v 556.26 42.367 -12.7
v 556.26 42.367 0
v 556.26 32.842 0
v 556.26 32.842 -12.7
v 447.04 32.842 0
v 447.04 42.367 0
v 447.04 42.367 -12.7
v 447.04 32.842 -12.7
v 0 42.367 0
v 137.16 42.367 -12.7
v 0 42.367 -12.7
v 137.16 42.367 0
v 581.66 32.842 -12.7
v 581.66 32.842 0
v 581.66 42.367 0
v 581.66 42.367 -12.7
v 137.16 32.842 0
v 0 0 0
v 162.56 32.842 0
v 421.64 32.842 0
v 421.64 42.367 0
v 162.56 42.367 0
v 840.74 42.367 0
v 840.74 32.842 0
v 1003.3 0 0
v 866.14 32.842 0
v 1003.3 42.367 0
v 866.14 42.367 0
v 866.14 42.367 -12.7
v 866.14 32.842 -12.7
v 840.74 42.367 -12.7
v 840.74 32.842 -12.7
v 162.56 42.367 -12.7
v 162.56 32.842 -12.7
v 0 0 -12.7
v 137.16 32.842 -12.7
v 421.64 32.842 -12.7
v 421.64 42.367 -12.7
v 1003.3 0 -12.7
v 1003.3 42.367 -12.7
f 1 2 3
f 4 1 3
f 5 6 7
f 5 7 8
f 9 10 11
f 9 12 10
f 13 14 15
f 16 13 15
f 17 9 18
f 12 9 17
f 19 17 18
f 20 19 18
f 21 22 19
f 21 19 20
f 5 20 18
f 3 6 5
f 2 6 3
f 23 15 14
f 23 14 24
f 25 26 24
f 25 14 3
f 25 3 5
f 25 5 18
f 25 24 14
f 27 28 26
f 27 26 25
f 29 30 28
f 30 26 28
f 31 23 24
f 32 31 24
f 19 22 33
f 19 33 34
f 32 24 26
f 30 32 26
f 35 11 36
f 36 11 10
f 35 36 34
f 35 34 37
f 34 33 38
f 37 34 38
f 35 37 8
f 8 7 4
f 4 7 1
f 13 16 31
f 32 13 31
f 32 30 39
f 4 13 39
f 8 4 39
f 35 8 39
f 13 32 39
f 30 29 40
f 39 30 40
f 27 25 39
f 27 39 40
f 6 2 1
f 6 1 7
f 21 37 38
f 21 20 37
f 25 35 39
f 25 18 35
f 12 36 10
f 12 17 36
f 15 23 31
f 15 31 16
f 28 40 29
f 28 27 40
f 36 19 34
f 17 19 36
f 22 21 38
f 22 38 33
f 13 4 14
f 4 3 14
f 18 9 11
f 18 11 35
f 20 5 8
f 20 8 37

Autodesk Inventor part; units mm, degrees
ref_plane "YZ Plane" through (0, 0, 0) normal (1, 0, 0) x (0, 1, 0)
ref_plane "XZ Plane" through (0, 0, 0) normal (0, 1, 0) x (-1, 0, 0)
ref_plane "XY Plane" through (0, 0, 0) normal (0, 0, 1) x (1, 0, 0)
sketch "Sketch1" plane through (0, 0, 0) normal (0, 0, 1) x (1, 0, 0)
  line L0 (0, 0) -> (1003.3, 0)
  line L1 (1003.3, 0) -> (1003.3, 42.3672)
  line L2 (1003.3, 42.3672) -> (0, 42.3672)
  line L3 (0, 42.3672) -> (0, 0)
  dimension "d0" = 42.3672
  dimension "d1" = 1003.3
extrude "Extrusion1" add sketch "Sketch1" against normal blind 12.7
sketch "Sketch2" plane through (0, 0, 0) normal (0, 0, 1) x (1, 0, 0)
  line L0 (1003.3, 0) -> (1003.3, 42.3672) projected
  line L1 (1003.3, 42.3672) -> (0, 42.3672) projected
  line L2 (0, 42.3672) -> (0, 0) projected
  line L3 (137.16, 42.3672) -> (162.56, 42.3672)
  line L4 (162.56, 42.3672) -> (162.56, 32.8422)
  line L5 (162.56, 32.8422) -> (137.16, 32.8422)
  line L6 (137.16, 32.8422) -> (137.16, 42.3672)
  line L7 (866.14, 42.3672) -> (840.74, 42.3672)
  line L8 (840.74, 42.3672) -> (840.74, 32.8422)
  line L9 (840.74, 32.8422) -> (866.14, 32.8422)
  line L10 (866.14, 32.8422) -> (866.14, 42.3672)
  line L11 (421.64, 42.3672) -> (447.04, 42.3672)
  line L12 (447.04, 42.3672) -> (447.04, 32.8422)
  line L13 (447.04, 32.8422) -> (421.64, 32.8422)
  line L14 (421.64, 32.8422) -> (421.64, 42.3672)
  line L15 (581.66, 42.3672) -> (556.26, 42.3672)
  line L16 (556.26, 42.3672) -> (556.26, 32.8422)
  line L17 (556.26, 32.8422) -> (581.66, 32.8422)
  line L18 (581.66, 32.8422) -> (581.66, 42.3672)
  dimension "d4" = 9.525
  dimension "d5" = 25.4
  dimension "d6" = 137.16
  dimension "d7" = 137.16
  dimension "d8" = 25.4
  dimension "d9" = 9.525
  dimension "d12" = 421.64
  dimension "d13" = 25.4
  dimension "d14" = 9.525
  dimension "d15" = 421.64
  dimension "d16" = 25.4
  dimension "d17" = 9.525
extrude "Extrusion3" cut sketch "Sketch2" against normal blind 12.7
properties part number "spacer 2"
